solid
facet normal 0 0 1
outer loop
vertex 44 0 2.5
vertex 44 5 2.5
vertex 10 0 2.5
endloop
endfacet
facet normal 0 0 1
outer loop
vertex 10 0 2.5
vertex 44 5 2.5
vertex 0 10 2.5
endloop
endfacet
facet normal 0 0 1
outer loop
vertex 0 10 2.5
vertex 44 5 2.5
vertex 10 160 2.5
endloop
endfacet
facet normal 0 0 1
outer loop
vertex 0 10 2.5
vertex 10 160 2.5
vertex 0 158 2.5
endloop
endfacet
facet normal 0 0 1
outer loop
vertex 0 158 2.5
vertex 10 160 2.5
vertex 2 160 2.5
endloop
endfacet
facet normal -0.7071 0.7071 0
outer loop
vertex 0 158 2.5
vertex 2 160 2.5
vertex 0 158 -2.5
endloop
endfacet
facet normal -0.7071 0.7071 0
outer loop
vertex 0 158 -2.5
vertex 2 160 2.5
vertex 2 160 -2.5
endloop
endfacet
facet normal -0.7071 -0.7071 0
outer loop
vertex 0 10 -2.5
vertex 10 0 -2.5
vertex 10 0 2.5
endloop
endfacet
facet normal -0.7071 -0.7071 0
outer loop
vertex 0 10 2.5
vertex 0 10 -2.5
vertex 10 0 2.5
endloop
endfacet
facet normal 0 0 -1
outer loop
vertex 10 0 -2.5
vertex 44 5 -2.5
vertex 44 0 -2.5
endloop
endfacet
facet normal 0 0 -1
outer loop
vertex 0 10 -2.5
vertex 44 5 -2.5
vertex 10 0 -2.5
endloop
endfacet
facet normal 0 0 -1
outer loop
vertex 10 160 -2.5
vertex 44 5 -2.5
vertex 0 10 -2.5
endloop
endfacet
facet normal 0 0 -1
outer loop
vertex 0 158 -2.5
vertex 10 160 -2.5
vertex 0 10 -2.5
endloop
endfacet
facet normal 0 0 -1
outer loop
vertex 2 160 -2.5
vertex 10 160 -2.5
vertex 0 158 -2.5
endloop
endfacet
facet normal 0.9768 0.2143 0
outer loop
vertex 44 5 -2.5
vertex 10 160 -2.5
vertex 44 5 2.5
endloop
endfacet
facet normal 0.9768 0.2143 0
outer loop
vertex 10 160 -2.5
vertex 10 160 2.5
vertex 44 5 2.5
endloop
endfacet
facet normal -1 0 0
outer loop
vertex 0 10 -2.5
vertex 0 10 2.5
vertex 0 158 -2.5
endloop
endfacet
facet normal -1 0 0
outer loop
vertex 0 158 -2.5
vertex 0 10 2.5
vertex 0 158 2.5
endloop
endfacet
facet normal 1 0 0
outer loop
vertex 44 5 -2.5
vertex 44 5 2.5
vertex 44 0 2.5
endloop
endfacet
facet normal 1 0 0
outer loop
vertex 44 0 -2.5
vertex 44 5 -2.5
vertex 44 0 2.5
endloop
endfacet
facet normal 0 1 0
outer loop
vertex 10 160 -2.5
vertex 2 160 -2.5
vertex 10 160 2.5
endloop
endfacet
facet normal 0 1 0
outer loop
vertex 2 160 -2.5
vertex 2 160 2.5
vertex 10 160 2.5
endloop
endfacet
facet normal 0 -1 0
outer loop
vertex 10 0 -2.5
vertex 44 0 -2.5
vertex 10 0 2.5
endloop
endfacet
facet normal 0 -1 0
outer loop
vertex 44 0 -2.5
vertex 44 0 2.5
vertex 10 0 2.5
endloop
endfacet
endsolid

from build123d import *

# Parameters (mm, degrees)
EXTRUDE_1_DEPTH = 2.5
CHAMFER_1_SIZE  = 10
CHAMFER_2_SIZE  = 2


with BuildPart() as part:
    # Эскиз1 → Бобышка-Вытянуть1 (new, symmetric)
    with BuildSketch(Plane.XY):
        Polygon((0, 0), (0, 160), (10, 160), (44, 5), (44, 0), align=None)
    extrude(amount=EXTRUDE_1_DEPTH, both=True)

    # Фаска1
    chamfer_1_edges = [part.edges().sort_by_distance(p)[0] for p in [
        (0, 0, 0),
    ]]
    chamfer(chamfer_1_edges, length=CHAMFER_1_SIZE)

    # Фаска2
    chamfer_2_edges = [part.edges().sort_by_distance(p)[0] for p in [
        (0, 160, 0),
    ]]
    chamfer(chamfer_2_edges, length=CHAMFER_2_SIZE)


solid = part.part
